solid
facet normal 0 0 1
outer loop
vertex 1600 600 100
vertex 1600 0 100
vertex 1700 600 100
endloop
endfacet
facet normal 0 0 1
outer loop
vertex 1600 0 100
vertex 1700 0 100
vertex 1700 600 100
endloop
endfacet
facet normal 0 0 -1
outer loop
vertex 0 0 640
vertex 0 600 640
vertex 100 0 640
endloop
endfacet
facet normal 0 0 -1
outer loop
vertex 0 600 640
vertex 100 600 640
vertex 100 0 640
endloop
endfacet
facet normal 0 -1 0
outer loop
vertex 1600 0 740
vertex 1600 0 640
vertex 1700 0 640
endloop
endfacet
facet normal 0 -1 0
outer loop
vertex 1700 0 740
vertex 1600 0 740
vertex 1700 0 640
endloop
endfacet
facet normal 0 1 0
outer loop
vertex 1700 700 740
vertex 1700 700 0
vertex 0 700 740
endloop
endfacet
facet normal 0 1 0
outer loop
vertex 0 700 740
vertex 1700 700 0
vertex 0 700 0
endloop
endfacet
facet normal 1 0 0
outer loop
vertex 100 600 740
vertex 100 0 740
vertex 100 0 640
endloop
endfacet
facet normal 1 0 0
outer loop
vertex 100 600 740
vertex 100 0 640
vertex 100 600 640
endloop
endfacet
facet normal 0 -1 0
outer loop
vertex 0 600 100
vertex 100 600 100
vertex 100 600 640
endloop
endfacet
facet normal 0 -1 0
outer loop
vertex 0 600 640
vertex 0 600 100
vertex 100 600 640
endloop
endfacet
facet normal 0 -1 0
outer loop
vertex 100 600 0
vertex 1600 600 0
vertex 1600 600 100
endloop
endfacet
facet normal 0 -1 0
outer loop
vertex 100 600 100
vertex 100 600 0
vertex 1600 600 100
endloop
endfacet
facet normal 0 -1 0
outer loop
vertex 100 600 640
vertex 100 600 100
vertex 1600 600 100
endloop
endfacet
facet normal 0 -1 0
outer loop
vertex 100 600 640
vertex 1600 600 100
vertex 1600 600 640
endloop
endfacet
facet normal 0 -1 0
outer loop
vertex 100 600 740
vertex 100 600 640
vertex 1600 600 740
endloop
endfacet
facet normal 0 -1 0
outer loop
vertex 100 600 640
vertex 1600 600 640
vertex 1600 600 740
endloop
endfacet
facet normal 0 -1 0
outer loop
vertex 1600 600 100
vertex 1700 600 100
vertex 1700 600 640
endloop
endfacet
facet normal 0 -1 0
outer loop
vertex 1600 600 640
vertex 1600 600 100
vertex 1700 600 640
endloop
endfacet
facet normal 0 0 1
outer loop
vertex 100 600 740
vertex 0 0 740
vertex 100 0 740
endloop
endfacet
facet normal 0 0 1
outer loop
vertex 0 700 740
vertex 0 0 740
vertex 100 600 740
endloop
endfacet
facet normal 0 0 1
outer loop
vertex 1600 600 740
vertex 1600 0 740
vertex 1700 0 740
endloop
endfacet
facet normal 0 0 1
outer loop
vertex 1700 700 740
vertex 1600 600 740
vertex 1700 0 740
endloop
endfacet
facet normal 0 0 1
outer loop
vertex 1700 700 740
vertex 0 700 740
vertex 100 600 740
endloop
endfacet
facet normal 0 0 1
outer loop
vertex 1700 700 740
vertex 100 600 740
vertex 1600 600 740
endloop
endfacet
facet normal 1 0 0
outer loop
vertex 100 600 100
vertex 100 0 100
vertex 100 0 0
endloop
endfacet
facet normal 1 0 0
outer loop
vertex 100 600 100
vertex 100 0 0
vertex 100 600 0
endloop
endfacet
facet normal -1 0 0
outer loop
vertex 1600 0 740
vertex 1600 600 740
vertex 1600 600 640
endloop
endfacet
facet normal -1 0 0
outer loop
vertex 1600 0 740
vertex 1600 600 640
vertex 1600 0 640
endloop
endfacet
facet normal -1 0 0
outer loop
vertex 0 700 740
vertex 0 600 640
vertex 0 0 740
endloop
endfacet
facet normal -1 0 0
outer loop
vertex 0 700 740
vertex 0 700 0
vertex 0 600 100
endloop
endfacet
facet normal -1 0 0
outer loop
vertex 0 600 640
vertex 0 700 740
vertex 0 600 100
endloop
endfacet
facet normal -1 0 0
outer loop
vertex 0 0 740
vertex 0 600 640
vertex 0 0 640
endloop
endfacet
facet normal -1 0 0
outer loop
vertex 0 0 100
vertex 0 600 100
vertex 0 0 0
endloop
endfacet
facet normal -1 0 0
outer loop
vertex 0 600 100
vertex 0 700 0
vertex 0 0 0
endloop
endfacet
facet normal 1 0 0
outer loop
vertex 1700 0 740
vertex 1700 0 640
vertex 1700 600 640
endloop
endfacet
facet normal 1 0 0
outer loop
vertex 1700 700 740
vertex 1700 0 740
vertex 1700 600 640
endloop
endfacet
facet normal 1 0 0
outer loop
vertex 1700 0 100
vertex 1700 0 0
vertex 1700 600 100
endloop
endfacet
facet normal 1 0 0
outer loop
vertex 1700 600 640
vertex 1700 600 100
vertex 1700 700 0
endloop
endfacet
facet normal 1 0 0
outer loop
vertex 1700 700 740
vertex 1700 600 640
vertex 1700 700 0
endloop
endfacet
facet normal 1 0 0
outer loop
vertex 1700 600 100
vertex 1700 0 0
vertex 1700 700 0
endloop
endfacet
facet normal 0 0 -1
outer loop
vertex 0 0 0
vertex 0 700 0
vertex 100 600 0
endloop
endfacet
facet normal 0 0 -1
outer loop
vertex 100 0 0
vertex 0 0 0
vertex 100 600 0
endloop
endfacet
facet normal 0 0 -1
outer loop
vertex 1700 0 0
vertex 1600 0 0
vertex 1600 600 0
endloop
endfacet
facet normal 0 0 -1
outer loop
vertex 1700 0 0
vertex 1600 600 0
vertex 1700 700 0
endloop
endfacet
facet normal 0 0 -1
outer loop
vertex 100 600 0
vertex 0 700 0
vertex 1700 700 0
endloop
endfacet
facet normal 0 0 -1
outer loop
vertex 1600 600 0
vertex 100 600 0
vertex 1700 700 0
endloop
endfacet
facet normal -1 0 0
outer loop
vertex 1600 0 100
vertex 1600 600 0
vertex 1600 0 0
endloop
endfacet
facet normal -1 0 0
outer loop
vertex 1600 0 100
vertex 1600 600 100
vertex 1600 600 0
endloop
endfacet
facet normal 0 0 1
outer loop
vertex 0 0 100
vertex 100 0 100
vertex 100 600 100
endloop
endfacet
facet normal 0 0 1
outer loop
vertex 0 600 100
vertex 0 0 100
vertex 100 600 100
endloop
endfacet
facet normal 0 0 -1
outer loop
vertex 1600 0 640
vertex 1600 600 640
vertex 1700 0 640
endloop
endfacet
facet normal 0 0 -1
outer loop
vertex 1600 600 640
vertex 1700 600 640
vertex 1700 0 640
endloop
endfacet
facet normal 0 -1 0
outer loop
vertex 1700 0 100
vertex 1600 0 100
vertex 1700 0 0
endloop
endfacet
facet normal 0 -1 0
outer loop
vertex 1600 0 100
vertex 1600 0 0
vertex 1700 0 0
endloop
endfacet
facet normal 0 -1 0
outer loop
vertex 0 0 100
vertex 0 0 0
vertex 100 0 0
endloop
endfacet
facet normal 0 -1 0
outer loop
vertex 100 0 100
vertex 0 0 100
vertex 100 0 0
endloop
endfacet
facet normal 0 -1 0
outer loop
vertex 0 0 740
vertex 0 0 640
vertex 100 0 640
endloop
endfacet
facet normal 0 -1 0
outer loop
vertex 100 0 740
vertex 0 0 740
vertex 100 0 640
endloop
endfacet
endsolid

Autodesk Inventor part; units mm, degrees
ref_plane "YZ Plane" through (0, 0, 0) normal (1, 0, 0) x (0, 1, 0)
ref_plane "XZ Plane" through (0, 0, 0) normal (0, 1, 0) x (-1, 0, 0)
ref_plane "XY Plane" through (0, 0, 0) normal (0, 0, 1) x (1, 0, 0)
sketch "Sketch1" plane through (0, 0, 0) normal (0, 0, 1) x (1, 0, 0)
  point P0 (0, 0)
sketch "Sketch2" plane through (0, 0, 0) normal (0, 0, 1) x (1, 0, 0)
  line L0 (0, 0) -> (1700, 0)
  line L1 (1700, 0) -> (1700, 700)
  line L2 (1700, 700) -> (0, 700)
  line L3 (0, 700) -> (0, 0)
  dimension "d0" = 700
  dimension "d1" = 1700
extrude "Extrusion1" add sketch "Sketch2" along normal blind 740
sketch "Sketch3" plane through (0, 0, 740) normal (0, 0, 1) x (1, 0, 0)
  line L0 (1600, 0) -> (100, 0)
  line L1 (100, 0) -> (100, 600)
  line L2 (100, 600) -> (1600, 600)
  line L3 (1600, 600) -> (1600, 0)
  line L4 (1700, 700) -> (0, 700) projected
  line L5 (1700, 0) -> (1700, 700) projected
  line L6 (0, 700) -> (0, 0) projected
  dimension "d4" = 100
  dimension "d5" = 100
  dimension "d6" = 100
extrude "Extrusion2" cut sketch "Sketch3" against normal blind 740
sketch "Sketch4" plane through (1700, 0, 0) normal (1, 0, 0) x (0, 0, -1)
  line L0 (0, 0) -> (-740, 0) projected
  line L1 (-640, 0) -> (-100, 0)
  line L2 (-100, 0) -> (-100, 600)
  line L3 (-100, 600) -> (-640, 600)
  line L4 (-640, 600) -> (-640, 0)
  line L5 (0, 700) -> (-740, 700) projected
  line L6 (-740, 600) -> (-740, 0) projected
  line L7 (0, 0) -> (0, 700) projected
  dimension "d9" = 100
  dimension "d10" = 100
  dimension "d11" = 100
extrude "Extrusion3" cut sketch "Sketch4" against normal blind 4000
properties part number "computerBottom" material "Aluminum 6061, Welded"
